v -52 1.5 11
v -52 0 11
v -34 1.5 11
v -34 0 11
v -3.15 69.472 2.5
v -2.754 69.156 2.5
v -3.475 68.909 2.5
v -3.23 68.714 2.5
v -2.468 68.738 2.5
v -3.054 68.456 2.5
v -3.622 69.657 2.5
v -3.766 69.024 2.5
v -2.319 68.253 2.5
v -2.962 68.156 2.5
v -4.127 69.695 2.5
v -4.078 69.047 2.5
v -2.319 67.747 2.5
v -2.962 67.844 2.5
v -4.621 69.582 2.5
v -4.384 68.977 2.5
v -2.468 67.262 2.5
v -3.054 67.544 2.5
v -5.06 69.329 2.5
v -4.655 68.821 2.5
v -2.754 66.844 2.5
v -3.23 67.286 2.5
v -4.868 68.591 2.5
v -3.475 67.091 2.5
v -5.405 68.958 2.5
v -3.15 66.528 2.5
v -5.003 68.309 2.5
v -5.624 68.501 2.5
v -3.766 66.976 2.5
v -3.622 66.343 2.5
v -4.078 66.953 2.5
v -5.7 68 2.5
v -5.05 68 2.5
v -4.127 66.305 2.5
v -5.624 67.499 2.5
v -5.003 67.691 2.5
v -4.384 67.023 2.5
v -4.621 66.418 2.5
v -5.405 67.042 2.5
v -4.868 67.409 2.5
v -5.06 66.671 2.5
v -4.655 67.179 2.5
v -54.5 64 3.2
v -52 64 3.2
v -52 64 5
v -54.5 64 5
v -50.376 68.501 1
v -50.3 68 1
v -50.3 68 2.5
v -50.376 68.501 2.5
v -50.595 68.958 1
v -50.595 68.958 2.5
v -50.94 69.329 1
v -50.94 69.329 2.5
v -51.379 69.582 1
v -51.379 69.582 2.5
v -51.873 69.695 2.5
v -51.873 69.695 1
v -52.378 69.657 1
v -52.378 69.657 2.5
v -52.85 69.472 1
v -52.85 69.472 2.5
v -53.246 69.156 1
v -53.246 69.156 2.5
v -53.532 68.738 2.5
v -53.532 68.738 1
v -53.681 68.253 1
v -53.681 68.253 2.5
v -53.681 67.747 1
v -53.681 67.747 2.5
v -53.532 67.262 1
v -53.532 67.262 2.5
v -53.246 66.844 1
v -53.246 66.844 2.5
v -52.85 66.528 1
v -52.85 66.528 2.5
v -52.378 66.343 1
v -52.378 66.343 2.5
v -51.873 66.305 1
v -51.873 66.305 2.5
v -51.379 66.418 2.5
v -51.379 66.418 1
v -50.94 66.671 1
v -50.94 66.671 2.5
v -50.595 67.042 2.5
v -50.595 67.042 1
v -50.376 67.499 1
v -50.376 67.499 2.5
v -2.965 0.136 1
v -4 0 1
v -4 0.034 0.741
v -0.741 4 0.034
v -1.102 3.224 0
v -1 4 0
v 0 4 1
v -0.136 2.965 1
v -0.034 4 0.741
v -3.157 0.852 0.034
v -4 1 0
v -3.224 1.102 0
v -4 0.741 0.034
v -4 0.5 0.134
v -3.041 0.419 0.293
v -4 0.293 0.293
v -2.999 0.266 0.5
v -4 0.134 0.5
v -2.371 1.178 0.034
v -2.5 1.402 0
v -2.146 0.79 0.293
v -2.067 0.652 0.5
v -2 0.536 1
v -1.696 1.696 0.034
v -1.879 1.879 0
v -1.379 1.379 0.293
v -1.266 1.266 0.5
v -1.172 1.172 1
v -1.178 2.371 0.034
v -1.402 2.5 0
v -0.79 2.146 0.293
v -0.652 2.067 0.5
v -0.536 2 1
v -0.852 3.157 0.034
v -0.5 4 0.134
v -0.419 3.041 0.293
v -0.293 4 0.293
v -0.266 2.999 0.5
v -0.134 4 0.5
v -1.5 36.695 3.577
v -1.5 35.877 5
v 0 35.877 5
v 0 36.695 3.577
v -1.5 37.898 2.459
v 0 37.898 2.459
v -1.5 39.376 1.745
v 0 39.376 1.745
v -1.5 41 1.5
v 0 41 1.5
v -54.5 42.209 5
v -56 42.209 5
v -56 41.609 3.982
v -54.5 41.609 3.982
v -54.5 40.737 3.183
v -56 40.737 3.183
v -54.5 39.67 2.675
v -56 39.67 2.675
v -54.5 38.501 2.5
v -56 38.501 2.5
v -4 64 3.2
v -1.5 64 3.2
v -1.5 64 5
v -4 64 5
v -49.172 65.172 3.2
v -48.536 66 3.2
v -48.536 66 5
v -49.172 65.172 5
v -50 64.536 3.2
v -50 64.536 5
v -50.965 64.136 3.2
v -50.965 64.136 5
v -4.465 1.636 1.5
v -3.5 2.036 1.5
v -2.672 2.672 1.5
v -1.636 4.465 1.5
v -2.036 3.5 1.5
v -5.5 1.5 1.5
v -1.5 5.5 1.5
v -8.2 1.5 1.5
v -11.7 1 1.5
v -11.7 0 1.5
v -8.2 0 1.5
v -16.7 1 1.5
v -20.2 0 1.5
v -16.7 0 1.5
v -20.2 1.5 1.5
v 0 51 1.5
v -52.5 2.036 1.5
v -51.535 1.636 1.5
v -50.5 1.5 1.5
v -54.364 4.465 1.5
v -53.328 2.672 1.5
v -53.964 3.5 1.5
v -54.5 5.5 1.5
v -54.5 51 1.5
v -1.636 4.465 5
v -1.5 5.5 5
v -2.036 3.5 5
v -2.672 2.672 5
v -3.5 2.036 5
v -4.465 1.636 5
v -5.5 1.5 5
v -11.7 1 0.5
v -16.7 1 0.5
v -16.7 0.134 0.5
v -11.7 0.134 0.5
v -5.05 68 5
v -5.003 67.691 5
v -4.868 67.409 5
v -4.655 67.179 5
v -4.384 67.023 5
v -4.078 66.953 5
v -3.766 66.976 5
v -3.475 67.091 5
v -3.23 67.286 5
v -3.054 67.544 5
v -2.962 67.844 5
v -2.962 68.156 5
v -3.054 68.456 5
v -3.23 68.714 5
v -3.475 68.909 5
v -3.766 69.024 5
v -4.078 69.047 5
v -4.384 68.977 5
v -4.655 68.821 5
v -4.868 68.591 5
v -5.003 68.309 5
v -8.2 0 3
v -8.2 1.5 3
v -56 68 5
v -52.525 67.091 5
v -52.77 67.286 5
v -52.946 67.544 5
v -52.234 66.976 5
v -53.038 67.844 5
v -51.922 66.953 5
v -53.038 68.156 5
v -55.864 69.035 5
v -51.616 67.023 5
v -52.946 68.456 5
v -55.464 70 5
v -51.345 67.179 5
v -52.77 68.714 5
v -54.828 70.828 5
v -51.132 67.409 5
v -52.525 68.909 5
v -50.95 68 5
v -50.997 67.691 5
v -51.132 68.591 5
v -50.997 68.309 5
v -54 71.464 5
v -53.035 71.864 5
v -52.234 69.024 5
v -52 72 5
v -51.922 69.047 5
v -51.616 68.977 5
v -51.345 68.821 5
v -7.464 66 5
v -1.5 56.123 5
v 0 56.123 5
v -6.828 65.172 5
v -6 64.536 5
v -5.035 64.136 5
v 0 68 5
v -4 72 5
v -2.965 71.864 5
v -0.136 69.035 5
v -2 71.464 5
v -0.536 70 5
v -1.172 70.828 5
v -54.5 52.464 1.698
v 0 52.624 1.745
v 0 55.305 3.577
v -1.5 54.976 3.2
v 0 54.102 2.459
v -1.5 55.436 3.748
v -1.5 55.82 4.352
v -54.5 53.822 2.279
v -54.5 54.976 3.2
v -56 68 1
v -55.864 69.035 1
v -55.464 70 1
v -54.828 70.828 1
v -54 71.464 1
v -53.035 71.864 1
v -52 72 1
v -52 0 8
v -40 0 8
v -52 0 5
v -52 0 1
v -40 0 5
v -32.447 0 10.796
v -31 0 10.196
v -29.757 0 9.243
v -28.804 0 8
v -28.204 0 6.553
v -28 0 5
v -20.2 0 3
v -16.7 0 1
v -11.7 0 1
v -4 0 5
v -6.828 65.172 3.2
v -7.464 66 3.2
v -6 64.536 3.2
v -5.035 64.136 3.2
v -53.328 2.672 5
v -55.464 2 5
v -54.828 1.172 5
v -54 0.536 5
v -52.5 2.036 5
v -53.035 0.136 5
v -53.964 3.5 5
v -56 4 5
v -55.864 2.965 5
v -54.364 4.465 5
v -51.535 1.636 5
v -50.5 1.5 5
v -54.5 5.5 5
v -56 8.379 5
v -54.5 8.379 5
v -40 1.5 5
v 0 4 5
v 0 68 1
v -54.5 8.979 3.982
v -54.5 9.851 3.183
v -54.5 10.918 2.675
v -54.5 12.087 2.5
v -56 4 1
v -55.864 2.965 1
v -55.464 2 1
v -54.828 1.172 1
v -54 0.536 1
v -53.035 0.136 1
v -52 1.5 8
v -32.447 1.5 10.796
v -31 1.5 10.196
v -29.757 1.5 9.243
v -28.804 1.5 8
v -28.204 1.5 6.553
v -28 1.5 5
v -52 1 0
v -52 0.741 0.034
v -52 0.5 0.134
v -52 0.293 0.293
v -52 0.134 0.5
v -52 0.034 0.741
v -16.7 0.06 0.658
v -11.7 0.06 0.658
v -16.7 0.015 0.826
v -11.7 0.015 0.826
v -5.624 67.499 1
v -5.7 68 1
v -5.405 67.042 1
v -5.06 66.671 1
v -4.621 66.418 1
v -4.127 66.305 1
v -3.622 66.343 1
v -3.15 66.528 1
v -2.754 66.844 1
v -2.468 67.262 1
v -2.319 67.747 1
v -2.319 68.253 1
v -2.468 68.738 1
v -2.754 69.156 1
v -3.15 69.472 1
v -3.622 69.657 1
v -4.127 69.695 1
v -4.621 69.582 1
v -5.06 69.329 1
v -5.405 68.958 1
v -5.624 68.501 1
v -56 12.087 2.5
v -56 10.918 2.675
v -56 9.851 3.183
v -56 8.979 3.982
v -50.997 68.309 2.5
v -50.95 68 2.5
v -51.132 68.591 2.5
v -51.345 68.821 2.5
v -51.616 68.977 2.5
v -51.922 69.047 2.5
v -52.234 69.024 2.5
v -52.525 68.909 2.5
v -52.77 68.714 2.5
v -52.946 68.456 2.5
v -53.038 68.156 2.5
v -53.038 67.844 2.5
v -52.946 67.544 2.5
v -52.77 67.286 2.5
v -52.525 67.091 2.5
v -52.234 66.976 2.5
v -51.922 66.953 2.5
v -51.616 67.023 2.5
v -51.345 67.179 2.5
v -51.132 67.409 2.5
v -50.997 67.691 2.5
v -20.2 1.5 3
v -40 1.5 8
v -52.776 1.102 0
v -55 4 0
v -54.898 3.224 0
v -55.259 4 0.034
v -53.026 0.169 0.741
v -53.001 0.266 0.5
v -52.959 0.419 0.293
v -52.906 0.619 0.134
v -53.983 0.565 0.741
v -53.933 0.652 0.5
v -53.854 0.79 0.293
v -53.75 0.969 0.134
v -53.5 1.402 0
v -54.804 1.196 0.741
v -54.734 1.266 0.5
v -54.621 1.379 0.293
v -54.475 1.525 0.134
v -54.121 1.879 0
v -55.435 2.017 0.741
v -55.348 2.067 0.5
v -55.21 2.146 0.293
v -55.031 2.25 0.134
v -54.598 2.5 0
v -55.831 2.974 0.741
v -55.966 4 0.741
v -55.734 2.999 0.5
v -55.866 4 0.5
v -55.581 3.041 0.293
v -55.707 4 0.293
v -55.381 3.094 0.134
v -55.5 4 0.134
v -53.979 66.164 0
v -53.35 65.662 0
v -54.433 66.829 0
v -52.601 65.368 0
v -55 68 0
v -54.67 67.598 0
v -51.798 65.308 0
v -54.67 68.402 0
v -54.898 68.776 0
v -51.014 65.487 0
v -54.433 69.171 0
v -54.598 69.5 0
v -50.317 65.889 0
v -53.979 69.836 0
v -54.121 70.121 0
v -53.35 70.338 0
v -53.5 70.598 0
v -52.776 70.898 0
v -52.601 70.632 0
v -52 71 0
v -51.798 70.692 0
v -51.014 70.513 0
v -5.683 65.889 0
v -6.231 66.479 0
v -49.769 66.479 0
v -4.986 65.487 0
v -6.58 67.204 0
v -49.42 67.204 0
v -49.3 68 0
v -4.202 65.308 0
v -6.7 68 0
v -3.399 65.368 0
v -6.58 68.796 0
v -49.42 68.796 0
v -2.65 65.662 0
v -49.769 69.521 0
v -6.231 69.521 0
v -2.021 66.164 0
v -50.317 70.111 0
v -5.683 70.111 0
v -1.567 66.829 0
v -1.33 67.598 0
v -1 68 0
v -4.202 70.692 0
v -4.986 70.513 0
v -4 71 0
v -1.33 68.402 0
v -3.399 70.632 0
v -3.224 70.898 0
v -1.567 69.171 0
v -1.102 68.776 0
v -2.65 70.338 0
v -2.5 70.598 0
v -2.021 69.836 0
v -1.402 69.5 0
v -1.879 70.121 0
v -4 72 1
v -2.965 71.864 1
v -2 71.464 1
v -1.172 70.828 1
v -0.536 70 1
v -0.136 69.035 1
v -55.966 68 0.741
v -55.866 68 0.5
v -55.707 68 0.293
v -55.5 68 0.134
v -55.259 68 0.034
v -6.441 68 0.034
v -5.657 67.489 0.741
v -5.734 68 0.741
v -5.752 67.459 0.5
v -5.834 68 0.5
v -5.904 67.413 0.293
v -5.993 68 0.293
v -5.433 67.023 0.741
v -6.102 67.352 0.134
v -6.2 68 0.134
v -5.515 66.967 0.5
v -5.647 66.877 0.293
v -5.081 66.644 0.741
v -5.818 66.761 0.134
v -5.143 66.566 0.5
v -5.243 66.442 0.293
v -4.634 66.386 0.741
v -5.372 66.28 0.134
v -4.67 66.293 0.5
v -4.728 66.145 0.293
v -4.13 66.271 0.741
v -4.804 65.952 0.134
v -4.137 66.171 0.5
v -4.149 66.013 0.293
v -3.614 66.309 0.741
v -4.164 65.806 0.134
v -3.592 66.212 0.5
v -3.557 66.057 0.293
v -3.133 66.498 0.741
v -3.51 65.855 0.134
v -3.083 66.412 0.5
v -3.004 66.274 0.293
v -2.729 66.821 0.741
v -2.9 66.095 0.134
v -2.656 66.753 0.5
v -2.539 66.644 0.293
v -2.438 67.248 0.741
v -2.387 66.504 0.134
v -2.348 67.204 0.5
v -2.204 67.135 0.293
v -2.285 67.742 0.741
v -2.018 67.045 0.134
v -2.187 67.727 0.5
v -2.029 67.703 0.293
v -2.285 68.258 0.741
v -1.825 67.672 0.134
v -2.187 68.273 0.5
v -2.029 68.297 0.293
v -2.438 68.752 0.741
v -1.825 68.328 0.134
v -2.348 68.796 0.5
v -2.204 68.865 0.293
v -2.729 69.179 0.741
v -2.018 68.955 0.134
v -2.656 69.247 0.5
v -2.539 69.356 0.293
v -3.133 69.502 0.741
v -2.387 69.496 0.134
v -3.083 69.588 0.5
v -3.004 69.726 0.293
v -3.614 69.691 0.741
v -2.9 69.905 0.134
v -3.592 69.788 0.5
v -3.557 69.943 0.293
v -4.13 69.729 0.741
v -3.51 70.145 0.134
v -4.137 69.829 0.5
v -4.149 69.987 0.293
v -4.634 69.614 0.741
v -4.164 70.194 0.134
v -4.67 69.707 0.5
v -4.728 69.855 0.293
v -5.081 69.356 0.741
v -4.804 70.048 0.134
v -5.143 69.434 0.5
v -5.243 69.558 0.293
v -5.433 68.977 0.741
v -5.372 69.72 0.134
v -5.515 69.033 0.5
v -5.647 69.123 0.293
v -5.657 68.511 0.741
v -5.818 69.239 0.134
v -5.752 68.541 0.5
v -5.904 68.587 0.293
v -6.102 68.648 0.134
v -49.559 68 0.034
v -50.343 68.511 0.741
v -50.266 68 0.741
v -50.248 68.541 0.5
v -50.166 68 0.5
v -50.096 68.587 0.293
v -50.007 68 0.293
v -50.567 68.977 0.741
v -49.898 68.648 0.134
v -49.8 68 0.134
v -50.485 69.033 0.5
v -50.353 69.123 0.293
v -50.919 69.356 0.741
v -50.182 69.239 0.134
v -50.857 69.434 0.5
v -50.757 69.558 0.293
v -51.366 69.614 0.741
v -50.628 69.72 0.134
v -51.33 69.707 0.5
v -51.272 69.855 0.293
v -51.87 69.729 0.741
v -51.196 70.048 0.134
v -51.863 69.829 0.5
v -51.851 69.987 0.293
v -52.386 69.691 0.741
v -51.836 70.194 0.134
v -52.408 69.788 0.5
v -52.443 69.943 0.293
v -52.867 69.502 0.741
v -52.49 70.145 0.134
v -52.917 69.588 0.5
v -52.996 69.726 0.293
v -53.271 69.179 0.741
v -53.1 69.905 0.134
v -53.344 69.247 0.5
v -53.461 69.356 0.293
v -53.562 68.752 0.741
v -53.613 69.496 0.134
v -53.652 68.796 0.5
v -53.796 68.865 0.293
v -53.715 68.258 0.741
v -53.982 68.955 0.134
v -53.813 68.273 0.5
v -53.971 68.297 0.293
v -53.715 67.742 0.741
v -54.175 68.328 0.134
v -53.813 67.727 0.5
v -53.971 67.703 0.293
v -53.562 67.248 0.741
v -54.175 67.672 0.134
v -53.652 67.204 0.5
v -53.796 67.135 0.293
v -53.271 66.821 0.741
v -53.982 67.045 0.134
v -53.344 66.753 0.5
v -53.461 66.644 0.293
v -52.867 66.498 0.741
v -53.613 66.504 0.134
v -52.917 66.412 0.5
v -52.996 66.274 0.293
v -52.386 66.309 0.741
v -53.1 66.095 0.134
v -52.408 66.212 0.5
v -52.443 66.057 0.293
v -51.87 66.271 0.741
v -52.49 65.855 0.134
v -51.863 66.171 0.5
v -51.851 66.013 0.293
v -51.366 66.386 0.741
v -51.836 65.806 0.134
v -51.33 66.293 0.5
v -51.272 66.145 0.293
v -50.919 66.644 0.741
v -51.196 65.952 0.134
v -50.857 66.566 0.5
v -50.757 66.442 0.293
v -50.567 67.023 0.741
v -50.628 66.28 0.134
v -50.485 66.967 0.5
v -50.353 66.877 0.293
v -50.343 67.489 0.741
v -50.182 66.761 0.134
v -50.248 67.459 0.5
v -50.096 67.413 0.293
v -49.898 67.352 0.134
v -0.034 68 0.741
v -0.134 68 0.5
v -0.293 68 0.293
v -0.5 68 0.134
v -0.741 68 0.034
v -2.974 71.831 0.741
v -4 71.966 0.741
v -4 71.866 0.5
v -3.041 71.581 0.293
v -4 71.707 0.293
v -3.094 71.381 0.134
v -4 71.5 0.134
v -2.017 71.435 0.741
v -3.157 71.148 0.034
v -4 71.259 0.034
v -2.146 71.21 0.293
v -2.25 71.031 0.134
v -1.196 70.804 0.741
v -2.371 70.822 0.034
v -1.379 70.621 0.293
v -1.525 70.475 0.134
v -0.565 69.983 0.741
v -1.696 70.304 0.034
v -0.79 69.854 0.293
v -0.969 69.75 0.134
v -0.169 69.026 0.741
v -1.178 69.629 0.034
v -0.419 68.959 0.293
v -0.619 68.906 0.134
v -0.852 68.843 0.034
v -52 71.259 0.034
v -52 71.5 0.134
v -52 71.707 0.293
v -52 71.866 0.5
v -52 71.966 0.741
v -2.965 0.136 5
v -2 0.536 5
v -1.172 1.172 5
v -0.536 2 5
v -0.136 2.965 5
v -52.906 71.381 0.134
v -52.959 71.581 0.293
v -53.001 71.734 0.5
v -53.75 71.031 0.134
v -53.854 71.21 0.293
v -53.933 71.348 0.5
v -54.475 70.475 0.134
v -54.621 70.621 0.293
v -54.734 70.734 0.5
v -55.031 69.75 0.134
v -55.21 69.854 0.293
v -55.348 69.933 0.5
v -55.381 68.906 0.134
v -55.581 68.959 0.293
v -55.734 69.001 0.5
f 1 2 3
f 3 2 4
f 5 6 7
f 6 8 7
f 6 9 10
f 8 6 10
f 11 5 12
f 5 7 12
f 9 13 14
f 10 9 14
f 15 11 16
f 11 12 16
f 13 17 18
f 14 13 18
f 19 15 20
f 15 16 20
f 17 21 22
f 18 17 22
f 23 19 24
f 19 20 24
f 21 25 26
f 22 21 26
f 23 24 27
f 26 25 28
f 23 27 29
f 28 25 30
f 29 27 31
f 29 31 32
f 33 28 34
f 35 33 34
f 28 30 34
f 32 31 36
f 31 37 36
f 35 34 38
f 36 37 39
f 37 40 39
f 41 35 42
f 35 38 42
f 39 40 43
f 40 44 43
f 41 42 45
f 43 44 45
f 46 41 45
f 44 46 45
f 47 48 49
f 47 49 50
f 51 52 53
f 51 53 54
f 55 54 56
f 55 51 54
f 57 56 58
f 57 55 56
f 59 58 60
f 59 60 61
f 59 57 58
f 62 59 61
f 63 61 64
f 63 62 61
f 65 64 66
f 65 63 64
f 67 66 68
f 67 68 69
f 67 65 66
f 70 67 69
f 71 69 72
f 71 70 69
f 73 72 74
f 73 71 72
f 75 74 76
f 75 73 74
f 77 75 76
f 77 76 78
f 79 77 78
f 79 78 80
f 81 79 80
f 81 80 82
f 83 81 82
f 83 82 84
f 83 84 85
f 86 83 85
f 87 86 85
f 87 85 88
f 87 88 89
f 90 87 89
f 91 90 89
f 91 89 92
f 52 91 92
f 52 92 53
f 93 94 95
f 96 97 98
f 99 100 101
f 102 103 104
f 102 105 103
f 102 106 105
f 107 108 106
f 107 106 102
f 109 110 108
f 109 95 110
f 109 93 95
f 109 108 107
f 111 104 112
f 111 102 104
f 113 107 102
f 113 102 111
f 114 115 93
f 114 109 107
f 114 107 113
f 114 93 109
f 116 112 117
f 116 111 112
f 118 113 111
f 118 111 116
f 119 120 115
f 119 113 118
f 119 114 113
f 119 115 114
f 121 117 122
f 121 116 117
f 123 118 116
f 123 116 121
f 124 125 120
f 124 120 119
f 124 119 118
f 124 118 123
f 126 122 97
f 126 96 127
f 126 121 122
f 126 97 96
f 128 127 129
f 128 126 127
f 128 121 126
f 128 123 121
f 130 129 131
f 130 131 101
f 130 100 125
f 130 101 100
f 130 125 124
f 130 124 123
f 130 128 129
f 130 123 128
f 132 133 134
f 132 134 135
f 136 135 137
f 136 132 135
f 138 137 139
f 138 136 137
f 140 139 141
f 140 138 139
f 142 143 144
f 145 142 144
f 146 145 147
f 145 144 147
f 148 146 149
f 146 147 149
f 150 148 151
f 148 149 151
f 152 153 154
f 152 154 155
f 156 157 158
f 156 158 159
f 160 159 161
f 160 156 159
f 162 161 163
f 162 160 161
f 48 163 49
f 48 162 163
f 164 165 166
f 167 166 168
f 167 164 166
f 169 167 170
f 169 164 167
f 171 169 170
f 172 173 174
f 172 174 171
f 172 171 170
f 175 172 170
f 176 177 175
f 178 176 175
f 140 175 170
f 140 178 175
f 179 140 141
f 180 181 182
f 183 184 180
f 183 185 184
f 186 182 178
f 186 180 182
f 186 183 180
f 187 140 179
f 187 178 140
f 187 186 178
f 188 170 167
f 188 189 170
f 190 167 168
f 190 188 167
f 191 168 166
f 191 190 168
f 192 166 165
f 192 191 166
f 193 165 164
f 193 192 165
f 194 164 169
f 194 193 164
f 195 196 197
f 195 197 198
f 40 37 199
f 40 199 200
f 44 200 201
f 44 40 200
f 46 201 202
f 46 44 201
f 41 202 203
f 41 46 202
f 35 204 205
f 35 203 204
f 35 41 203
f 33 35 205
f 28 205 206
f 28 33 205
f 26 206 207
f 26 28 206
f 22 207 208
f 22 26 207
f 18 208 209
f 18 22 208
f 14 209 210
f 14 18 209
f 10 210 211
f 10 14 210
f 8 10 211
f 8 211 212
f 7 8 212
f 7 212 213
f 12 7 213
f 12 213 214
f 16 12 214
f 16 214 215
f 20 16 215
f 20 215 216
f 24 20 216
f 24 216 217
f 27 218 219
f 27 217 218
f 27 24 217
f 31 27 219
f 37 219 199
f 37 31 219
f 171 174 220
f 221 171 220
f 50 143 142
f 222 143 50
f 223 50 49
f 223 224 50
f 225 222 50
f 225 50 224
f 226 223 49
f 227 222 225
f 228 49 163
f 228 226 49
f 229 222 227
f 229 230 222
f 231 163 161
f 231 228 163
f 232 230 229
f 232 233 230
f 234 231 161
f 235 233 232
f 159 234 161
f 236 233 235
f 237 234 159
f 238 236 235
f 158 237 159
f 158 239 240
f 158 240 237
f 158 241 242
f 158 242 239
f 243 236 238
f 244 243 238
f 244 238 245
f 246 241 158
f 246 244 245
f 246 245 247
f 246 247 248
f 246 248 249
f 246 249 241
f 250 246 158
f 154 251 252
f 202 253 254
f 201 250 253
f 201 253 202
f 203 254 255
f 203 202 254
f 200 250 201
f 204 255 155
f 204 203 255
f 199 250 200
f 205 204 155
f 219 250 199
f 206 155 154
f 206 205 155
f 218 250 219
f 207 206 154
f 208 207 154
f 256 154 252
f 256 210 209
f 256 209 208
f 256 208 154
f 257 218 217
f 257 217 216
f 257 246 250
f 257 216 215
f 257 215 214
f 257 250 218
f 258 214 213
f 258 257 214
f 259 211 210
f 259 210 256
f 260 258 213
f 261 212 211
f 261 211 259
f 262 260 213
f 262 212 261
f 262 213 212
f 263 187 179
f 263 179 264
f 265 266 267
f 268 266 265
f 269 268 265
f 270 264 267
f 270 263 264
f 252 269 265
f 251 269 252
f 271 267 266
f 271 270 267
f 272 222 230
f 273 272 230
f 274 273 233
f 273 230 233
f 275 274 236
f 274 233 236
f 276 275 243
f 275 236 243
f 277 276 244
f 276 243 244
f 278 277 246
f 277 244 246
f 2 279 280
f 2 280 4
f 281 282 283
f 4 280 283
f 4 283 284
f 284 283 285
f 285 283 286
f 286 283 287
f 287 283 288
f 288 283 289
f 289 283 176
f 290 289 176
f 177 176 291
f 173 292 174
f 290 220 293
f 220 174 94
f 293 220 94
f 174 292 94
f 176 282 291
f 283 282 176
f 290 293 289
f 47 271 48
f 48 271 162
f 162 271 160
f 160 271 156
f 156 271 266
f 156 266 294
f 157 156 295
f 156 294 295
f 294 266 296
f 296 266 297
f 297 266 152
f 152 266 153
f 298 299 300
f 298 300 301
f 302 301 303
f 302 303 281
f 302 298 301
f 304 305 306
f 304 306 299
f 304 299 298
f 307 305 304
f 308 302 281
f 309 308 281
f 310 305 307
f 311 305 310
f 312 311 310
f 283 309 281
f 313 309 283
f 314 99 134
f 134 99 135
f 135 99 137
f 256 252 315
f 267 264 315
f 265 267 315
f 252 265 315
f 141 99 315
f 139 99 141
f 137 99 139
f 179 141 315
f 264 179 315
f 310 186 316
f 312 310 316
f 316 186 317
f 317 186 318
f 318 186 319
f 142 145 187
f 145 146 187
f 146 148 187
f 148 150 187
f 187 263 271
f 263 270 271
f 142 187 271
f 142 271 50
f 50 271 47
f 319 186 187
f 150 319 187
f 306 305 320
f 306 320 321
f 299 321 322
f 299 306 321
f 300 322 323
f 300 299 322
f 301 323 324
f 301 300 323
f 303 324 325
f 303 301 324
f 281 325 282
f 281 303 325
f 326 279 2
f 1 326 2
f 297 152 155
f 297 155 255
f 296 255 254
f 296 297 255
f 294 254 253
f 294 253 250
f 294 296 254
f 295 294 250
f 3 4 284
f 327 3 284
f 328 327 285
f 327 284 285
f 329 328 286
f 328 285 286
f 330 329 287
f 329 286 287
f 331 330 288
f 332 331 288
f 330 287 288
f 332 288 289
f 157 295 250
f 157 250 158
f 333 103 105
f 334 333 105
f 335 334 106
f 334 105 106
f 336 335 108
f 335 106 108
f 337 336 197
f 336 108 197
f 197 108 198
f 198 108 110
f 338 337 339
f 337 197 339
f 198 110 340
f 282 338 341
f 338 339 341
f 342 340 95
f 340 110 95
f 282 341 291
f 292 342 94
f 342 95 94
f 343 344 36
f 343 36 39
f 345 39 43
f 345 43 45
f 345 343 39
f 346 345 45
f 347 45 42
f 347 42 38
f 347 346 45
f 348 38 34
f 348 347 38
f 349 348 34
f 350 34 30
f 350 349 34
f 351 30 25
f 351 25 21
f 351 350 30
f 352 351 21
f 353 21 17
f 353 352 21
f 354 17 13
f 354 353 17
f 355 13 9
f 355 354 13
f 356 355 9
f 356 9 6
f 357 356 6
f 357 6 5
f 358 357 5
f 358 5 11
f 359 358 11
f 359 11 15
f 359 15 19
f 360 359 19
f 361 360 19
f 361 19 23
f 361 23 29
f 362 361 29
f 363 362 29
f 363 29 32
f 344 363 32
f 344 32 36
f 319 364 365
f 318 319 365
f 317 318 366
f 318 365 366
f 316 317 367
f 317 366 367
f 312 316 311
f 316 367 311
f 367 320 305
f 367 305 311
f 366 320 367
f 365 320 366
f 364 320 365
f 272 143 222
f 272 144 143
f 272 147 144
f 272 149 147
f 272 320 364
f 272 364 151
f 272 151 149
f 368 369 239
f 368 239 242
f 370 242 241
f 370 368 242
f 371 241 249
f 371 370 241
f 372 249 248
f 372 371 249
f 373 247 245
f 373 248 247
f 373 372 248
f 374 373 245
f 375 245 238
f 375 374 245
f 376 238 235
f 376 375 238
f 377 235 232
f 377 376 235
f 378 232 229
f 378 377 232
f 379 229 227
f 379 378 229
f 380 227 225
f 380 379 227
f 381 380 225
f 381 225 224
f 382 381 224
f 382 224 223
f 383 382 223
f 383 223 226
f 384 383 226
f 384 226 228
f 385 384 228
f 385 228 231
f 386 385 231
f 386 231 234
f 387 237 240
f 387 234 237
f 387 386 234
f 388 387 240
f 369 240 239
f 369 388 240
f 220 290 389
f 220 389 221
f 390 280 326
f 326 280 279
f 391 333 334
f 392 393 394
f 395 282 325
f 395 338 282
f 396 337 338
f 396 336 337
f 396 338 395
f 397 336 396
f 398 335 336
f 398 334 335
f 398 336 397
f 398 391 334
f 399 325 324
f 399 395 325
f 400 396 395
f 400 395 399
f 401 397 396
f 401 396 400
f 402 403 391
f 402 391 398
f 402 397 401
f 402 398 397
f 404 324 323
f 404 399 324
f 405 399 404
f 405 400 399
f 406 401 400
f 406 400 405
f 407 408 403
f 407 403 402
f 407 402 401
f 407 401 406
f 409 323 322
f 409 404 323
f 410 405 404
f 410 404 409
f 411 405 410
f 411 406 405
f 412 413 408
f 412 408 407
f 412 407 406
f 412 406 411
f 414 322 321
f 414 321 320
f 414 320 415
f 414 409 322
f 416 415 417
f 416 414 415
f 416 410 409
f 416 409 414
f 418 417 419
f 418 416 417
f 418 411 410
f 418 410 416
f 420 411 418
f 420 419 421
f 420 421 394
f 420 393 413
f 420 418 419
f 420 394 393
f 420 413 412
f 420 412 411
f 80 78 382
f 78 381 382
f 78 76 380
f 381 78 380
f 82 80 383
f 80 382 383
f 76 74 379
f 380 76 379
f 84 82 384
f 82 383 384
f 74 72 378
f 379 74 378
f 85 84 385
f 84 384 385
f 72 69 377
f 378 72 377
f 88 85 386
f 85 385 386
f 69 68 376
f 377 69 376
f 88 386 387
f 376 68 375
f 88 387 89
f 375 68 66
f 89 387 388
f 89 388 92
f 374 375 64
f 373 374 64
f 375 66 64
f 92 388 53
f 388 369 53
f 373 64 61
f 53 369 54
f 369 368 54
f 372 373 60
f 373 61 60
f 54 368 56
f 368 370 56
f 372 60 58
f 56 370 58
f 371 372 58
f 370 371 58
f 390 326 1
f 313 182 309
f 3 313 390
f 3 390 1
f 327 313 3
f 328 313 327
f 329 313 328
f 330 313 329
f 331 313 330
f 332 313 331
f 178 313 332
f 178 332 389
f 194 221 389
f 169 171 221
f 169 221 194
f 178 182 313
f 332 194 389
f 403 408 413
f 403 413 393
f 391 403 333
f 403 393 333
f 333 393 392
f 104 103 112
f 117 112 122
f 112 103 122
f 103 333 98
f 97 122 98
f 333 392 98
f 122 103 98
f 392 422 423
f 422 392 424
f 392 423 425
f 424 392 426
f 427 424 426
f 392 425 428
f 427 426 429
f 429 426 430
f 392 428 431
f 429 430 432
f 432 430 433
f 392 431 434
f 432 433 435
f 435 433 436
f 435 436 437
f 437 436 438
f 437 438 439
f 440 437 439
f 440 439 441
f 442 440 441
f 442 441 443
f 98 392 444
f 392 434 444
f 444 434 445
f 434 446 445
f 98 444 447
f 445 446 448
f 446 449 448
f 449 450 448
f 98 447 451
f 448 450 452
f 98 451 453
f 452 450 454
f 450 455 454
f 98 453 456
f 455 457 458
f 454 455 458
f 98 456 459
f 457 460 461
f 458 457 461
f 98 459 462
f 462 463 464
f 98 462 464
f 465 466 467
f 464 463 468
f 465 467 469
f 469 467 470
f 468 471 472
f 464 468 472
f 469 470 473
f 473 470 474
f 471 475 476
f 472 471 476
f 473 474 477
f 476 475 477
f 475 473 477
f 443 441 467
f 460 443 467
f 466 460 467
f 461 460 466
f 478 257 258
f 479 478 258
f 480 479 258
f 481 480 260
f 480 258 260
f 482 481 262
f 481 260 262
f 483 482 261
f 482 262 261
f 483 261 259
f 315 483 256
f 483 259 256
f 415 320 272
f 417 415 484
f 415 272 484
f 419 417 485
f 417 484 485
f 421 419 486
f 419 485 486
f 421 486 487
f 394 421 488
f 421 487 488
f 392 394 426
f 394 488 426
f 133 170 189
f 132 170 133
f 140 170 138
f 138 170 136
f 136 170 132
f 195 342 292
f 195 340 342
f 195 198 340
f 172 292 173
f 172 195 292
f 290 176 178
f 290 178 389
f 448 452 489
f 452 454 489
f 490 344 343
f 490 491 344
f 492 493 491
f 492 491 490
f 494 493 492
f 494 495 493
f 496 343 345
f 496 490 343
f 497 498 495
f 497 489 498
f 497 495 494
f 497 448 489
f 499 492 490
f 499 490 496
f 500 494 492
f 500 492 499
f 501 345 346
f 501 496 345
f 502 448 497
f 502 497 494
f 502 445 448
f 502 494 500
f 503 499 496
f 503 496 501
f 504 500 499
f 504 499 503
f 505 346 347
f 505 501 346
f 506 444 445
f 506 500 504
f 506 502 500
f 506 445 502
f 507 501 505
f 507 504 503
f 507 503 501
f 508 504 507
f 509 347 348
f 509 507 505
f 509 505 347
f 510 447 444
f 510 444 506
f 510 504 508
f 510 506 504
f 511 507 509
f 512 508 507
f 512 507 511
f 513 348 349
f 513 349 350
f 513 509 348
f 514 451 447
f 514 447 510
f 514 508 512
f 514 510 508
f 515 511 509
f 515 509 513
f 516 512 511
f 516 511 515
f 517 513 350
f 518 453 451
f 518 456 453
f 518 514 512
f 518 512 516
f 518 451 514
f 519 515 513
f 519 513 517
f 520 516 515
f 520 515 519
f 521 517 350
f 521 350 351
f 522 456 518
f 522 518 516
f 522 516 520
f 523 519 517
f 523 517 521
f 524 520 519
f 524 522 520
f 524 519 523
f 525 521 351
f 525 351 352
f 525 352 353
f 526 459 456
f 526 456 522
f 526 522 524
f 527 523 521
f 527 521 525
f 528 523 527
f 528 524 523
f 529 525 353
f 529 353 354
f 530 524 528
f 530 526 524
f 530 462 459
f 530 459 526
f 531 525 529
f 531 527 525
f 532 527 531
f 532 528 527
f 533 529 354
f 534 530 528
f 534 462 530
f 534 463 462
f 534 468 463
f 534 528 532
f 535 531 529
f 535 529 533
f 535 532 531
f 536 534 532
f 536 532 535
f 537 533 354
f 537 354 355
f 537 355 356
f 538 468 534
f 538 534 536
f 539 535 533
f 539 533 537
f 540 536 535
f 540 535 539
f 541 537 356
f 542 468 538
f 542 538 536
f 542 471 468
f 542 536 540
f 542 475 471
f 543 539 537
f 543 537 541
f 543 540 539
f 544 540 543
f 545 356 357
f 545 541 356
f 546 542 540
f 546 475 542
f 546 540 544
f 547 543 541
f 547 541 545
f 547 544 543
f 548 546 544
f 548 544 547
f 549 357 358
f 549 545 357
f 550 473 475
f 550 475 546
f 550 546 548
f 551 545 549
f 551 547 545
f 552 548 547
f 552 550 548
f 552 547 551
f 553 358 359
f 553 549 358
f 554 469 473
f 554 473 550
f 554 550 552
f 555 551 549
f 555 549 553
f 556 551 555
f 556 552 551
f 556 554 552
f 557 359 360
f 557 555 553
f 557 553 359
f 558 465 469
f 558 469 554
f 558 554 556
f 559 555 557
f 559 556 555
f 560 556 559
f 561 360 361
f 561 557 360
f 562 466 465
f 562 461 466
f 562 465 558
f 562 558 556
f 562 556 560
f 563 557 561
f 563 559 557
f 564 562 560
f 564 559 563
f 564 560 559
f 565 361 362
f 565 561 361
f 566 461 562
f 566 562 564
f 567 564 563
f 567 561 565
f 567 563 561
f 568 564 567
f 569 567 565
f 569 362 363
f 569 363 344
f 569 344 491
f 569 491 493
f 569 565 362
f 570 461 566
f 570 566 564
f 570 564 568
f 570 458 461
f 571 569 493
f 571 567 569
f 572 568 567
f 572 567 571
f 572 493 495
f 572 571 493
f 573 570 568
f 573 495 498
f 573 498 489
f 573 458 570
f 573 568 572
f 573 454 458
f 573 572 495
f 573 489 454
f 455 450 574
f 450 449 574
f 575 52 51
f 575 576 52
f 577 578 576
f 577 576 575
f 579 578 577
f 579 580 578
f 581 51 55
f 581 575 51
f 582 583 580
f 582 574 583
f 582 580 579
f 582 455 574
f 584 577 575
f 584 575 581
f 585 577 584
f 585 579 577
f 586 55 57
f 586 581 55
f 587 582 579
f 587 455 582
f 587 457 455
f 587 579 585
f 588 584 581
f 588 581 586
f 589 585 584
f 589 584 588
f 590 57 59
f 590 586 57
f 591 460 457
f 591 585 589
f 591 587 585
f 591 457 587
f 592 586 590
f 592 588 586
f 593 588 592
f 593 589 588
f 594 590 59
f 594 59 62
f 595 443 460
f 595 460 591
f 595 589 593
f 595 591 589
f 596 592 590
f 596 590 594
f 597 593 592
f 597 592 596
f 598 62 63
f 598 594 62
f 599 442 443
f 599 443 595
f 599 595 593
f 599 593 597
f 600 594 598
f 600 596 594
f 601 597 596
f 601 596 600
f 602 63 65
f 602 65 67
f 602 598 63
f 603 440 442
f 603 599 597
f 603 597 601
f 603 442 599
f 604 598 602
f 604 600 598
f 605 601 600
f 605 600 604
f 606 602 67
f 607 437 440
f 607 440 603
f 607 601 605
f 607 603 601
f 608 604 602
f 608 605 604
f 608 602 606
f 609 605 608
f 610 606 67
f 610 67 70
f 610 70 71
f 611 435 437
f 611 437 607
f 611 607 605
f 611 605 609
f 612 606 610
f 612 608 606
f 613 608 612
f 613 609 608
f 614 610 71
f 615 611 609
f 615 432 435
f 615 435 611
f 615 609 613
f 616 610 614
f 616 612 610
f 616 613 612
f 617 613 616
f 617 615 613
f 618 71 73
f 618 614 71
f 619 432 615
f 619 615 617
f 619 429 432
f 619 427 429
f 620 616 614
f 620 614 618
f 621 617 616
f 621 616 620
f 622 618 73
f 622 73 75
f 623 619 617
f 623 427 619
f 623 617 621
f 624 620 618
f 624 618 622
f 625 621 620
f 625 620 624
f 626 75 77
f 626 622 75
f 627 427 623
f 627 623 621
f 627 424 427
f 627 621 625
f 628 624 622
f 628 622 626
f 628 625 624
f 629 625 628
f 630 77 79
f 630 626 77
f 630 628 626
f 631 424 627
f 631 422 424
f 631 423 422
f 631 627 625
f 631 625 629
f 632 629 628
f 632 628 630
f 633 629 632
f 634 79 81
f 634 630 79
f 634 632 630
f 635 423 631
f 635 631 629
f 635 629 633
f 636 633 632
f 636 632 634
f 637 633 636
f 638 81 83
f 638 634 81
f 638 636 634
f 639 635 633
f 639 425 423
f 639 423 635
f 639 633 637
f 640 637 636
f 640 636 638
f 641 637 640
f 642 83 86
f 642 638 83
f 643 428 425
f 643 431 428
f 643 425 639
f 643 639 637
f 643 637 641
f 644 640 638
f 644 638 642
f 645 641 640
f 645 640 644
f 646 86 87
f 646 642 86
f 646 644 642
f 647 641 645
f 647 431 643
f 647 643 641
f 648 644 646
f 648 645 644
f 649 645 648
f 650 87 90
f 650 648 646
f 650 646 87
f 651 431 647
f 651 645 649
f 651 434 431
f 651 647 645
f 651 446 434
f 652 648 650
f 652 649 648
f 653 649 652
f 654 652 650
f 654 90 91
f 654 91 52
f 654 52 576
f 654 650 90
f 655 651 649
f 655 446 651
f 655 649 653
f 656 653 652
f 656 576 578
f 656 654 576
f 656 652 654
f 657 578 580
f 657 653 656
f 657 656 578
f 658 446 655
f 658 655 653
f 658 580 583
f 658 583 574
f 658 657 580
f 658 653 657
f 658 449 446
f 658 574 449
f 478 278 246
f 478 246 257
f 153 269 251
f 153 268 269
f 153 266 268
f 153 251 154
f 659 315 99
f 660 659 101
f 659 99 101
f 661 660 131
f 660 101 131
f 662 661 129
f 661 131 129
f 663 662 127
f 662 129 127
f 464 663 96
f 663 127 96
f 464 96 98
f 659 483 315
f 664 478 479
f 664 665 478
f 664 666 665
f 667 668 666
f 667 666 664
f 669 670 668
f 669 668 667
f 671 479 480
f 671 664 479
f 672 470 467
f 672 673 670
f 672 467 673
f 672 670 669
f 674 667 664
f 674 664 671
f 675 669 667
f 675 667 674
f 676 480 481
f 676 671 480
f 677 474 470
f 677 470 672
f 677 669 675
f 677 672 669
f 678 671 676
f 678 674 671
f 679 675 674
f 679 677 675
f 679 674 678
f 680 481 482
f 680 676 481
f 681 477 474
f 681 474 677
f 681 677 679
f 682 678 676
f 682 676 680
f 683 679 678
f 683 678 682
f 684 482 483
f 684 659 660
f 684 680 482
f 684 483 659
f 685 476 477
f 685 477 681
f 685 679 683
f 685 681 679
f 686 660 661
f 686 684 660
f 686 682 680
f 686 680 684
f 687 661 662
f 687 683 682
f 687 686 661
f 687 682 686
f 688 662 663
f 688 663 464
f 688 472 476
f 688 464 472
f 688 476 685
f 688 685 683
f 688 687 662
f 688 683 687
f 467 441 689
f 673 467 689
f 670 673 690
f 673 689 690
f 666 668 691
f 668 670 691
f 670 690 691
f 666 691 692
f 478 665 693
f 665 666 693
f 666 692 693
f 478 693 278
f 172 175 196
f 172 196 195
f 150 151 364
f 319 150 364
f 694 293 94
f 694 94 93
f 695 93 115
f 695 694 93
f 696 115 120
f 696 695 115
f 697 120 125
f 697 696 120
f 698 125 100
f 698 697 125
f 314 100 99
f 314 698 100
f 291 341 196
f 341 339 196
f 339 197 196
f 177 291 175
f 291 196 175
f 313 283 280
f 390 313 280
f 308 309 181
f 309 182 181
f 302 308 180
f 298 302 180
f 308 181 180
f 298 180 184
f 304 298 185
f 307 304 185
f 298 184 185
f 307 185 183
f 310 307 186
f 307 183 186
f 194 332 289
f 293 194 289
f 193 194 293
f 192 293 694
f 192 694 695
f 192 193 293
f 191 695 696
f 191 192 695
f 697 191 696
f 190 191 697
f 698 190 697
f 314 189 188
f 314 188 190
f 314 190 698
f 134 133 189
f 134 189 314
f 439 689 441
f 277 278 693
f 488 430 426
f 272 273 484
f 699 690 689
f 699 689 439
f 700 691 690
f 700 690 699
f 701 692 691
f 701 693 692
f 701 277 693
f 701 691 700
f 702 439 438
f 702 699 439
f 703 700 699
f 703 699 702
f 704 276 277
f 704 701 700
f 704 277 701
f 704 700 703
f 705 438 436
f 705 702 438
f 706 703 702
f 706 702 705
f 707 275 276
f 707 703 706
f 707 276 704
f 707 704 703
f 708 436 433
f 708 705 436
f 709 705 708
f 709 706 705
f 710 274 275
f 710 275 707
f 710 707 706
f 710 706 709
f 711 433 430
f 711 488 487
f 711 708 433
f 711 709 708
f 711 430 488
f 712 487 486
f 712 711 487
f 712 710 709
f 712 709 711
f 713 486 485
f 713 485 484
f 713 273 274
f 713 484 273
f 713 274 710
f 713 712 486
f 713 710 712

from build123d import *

# Parameters (mm, degrees)
SKETCH_1_W               = 56
SKETCH_1_H               = 72
EXTRUDE_1_DEPTH          = 5
SHELL_1_T                = -1.5
EXTRUDE_2_DEPTH          = 5
EXTRUDE_4_REACH          = 93.351
SKETCH_11_W              = 3.2
SKETCH_11_H              = 28
CUT_EXTRUDE_1_REACH      = 93.351
SKETCH_2_7_R             = 1.05
SKETCH_2_8_R             = 1.7
CUT_EXTRUDE_2_DEPTH      = 2.5
EXTRUDE_3_DEPTH          = 1.5
CUT_EXTRUDE_3_REACH      = 93.875
SKETCH_10_3_W            = 12
SKETCH_10_3_H            = 1.5
CUT_EXTRUDE_4_DEPTH      = 92.874914966
CUT_EXTRUDE_4_DEPTH_BACK = 1
SKETCH_10_4_W            = 5
SKETCH_10_4_H            = 1
CUT_EXTRUDE_5_REACH      = 93.875
CUT_EXTRUDE_START        = -54.5
CUT_EXTRUDE_6_DEPTH      = 54.5
FILLET_1_R               = 4
FILLET_2_R               = 4
FILLET_3_R               = 1


with BuildPart() as part:
    # 草图1 → 凸台-拉伸1 (new body)
    with BuildSketch(Plane.XY):
        with Locations((-28, 36)):
            Rectangle(SKETCH_1_W, SKETCH_1_H)
    extrude(amount=EXTRUDE_1_DEPTH)

    # 抽壳1
    shell_1_openings = [part.faces().sort_by_distance(p)[0] for p in [
        (-28, 36, 5),
    ]]
    offset(amount=SHELL_1_T, openings=shell_1_openings, kind=Kind.INTERSECTION)

    # 草图2 → 凸台-拉伸2 (add)
    with BuildSketch(Plane.XY):
        with BuildLine():
            Line((0, 72), (0, 68))
            ThreePointArc((0, 68), (-0.394448725, 66.267949192), (-1.5, 64.877501001))
            Line((-1.5, 64.877501001), (-1.5, 64))
            Line((-1.5, 64), (-4, 64))
            ThreePointArc((-4, 64), (-6, 64.535898385), (-7.464101615, 66))
            Line((-7.464101615, 66), (-48.535898385, 66))
            ThreePointArc((-48.535898385, 66), (-50, 64.535898385), (-52, 64))
            Line((-52, 64), (-54.5, 64))
            Line((-54.5, 64), (-54.5, 64.877501001))
            ThreePointArc((-54.5, 64.877501001), (-55.605551275, 66.267949192), (-56, 68))
            Line((-56, 68), (-56, 72))
            Line((-56, 72), (0, 72))
        make_face()
    extrude(amount=EXTRUDE_2_DEPTH)

    # 草图11 → 凸台-拉伸4 (add, up to next)
    with BuildSketch(Plane(origin=(0, 0, 0), x_dir=(0, 0, -1), z_dir=(1, 0, 0)), mode=Mode.PRIVATE) as extrude_4_sk1:
        with Locations((-1.6, 58)):
            Rectangle(SKETCH_11_W, SKETCH_11_H)
    extrude_4_tool1 = extrude(extrude_4_sk1.sketch, amount=-EXTRUDE_4_REACH, mode=Mode.PRIVATE) - part.part
    add(extrude_4_tool1.solids().sort_by_distance((0, 58, 1.6))[0])

    # 草图2<7> → 切除-拉伸1 (cut, up to next)
    with BuildSketch(Plane.XY, mode=Mode.PRIVATE) as cut_extrude_1_sk1:
        with Locations((-52, 68)):
            Circle(SKETCH_2_7_R)
    cut_extrude_1_tool1 = extrude(cut_extrude_1_sk1.sketch, amount=CUT_EXTRUDE_1_REACH, mode=Mode.PRIVATE) & part.part
    # 草图2<7> → 切除-拉伸1 (cut, up to next)
    with BuildSketch(Plane.XY, mode=Mode.PRIVATE) as cut_extrude_1_sk2:
        with Locations(Location((-4, 68, 0), (0, 0, 180))):
            Circle(SKETCH_2_7_R)
    cut_extrude_1_tool2 = extrude(cut_extrude_1_sk2.sketch, amount=CUT_EXTRUDE_1_REACH, mode=Mode.PRIVATE) & part.part
    add(cut_extrude_1_tool1.solids().sort_by_distance((-52, 68, 0))[0], mode=Mode.SUBTRACT)
    add(cut_extrude_1_tool2.solids().sort_by_distance((-4, 68, 0))[0], mode=Mode.SUBTRACT)

    # 草图2<8> → 切除-拉伸2 (cut)
    with BuildSketch(Plane.XY):
        with Locations((-52, 68)):
            Circle(SKETCH_2_8_R)
        with Locations(Location((-4, 68, 0), (0, 0, 180))):
            Circle(SKETCH_2_8_R)
    extrude(amount=CUT_EXTRUDE_2_DEPTH, mode=Mode.SUBTRACT)

    # 草图10 → 凸台-拉伸3 (add)
    with BuildSketch(Plane.XZ):
        with BuildLine():
            Line((-40, 5), (-40, 8))
            Line((-40, 8), (-52, 8))
            Line((-52, 8), (-52, 11))
            Line((-52, 11), (-34, 11))
            ThreePointArc((-34, 11), (-29.757359313, 9.242640687), (-28, 5))
            Line((-28, 5), (-40, 5))
        make_face()
    extrude(amount=-EXTRUDE_3_DEPTH)

    # 草图10<3> → 切除-拉伸3 (cut, up to next)
    with BuildSketch(Plane.XZ, mode=Mode.PRIVATE) as cut_extrude_3_sk1:
        with Locations((-14.2, 2.25)):
            Rectangle(SKETCH_10_3_W, SKETCH_10_3_H)
    cut_extrude_3_tool1 = extrude(cut_extrude_3_sk1.sketch, amount=-CUT_EXTRUDE_3_REACH, mode=Mode.PRIVATE) & part.part
    add(cut_extrude_3_tool1.solids().sort_by_distance((-14.2, 0, 2.25))[0], mode=Mode.SUBTRACT)

    # 草图10<4> → 切除-拉伸4 (cut, two sides: drawn at the far end of the back side and taken through both)
    with BuildSketch(Plane.XZ.offset(-CUT_EXTRUDE_4_DEPTH_BACK)):
        with Locations((-14.2, 1)):
            Rectangle(SKETCH_10_4_W, SKETCH_10_4_H)
    extrude(amount=CUT_EXTRUDE_4_DEPTH + CUT_EXTRUDE_4_DEPTH_BACK, mode=Mode.SUBTRACT)

    # 草图8 → 切除-拉伸5 (cut, up to next)
    with BuildSketch(Plane.ZY.offset(56), mode=Mode.PRIVATE) as cut_extrude_5_sk1:
        with BuildLine():
            Line((2.5, 38.500900756), (2.5, 12.087099244))
            ThreePointArc((2.5, 12.087099244), (3.18337521, 9.851031266), (5, 8.379))
            Line((5, 8.379), (5, 42.209))
            ThreePointArc((5, 42.209), (3.18337521, 40.736968734), (2.5, 38.500900756))
        make_face()
    cut_extrude_5_tool1 = extrude(cut_extrude_5_sk1.sketch, amount=-CUT_EXTRUDE_5_REACH, mode=Mode.PRIVATE) & part.part
    add(cut_extrude_5_tool1.solids().sort_by_distance((-56, 25.294, 3.786685))[0], mode=Mode.SUBTRACT)

    # 草图9 → 切除-拉伸6 (cut)
    with BuildSketch(Plane(origin=(0, 0, 0), x_dir=(0, 0, -1), z_dir=(1, 0, 0)).offset(CUT_EXTRUDE_START)):
        with BuildLine():
            Line((-1.5, 41), (-1.5, 51))
            ThreePointArc((-1.5, 51), (-7, 56.5), (-12.5, 51))
            Line((-12.5, 51), (-12.5, 41))
            ThreePointArc((-12.5, 41), (-7, 35.5), (-1.5, 41))
        make_face()
    extrude(amount=CUT_EXTRUDE_6_DEPTH, mode=Mode.SUBTRACT)

    # 圆角1
    fillet_1_edges = [part.edges().sort_by_distance(p)[0] for p in [
        (0, 0, 2.5),
        (-56, 0, 2.5),
        (-56, 72, 2.5),
        (0, 72, 2.5),
    ]]
    fillet(fillet_1_edges, radius=FILLET_1_R)

    # 圆角2
    fillet_2_edges = [part.edges().sort_by_distance(p)[0] for p in [
        (-1.5, 1.5, 3.25),
        (-54.5, 1.5, 3.25),
    ]]
    fillet(fillet_2_edges, radius=FILLET_2_R)

    # 圆角3
    # the kernel refuses this fillet: 1 mm, written as the material it takes off along each edge
    with BuildSketch(Plane(origin=(-52, 68, 0), x_dir=(1, 0, 0), z_dir=(0, -1, 0))) as fillet_3_piece_1:
        with BuildLine():
            CenterArc((1.7 + FILLET_3_R, FILLET_3_R), FILLET_3_R, 180, 90)
            Line((1.7, FILLET_3_R), (1.7, 0))
            Line((1.7, 0), (1.7 + FILLET_3_R, 0))
        make_face()
    revolve(axis=Axis((-52, 68, 0), (0, 0, 1)), mode=Mode.SUBTRACT)
    with BuildSketch(Plane(origin=(-4, 68, 0), x_dir=(-1, 0, 0), z_dir=(0, 1, 0))) as fillet_3_piece_2:
        with BuildLine():
            CenterArc((1.7 + FILLET_3_R, FILLET_3_R), FILLET_3_R, 180, 90)
            Line((1.7, FILLET_3_R), (1.7, 0))
            Line((1.7, 0), (1.7 + FILLET_3_R, 0))
        make_face()
    revolve(axis=Axis((-4, 68, 0), (0, 0, 1)), mode=Mode.SUBTRACT)
    with BuildSketch(Plane(origin=(-4, 4, 0), x_dir=(0, -1, 0), z_dir=(-1, 0, 0))) as fillet_3_piece_3:
        with BuildLine():
            CenterArc((4 - FILLET_3_R, FILLET_3_R), FILLET_3_R, 270, 90)
            Line((4 - FILLET_3_R, 0), (4, 0))
            Line((4, 0), (4, FILLET_3_R))
        make_face()
    revolve(axis=Axis((-4, 4, 0), (0, 0, 1)), revolution_arc=90, mode=Mode.SUBTRACT)
    with BuildSketch(Plane(origin=(0, 4, 0), x_dir=(0, 0, 1), z_dir=(0, 1, 0))) as fillet_3_piece_4:
        with BuildLine():
            CenterArc((FILLET_3_R, -FILLET_3_R), FILLET_3_R, 90, 90)
            Line((0, -FILLET_3_R), (0, 0))
            Line((0, 0), (FILLET_3_R, 0))
        make_face()
    extrude(amount=64, mode=Mode.SUBTRACT)
    with BuildSketch(Plane(origin=(-4, 68, 0), x_dir=(0, 1, 0), z_dir=(-1, 0, 0))) as fillet_3_piece_5:
        with BuildLine():
            CenterArc((4 - FILLET_3_R, -FILLET_3_R), FILLET_3_R, 0, 90)
            Line((4, -FILLET_3_R), (4, 0))
            Line((4, 0), (4 - FILLET_3_R, 0))
        make_face()
    revolve(axis=Axis((-4, 68, 0), (0, 0, -1)), revolution_arc=90, mode=Mode.SUBTRACT)
    with BuildSketch(Plane(origin=(-52, 72, 0), x_dir=(0, -1, 0), z_dir=(1, 0, 0))) as fillet_3_piece_6:
        with BuildLine():
            CenterArc((FILLET_3_R, -FILLET_3_R), FILLET_3_R, 90, 90)
            Line((0, -FILLET_3_R), (0, 0))
            Line((0, 0), (FILLET_3_R, 0))
        make_face()
    extrude(amount=48, mode=Mode.SUBTRACT)
    with BuildSketch(Plane(origin=(-52, 68, 0), x_dir=(0, 1, 0), z_dir=(1, 0, 0))) as fillet_3_piece_7:
        with BuildLine():
            CenterArc((4 - FILLET_3_R, FILLET_3_R), FILLET_3_R, 270, 90)
            Line((4, FILLET_3_R), (4, 0))
            Line((4, 0), (4 - FILLET_3_R, 0))
        make_face()
    revolve(axis=Axis((-52, 68, 0), (0, 0, 1)), revolution_arc=90, mode=Mode.SUBTRACT)
    with BuildSketch(Plane(origin=(-56, 68, 0), x_dir=(1, 0, 0), z_dir=(0, -1, 0))) as fillet_3_piece_8:
        with BuildLine():
            CenterArc((FILLET_3_R, FILLET_3_R), FILLET_3_R, 180, 90)
            Line((0, FILLET_3_R), (0, 0))
            Line((0, 0), (FILLET_3_R, 0))
        make_face()
    extrude(amount=64, mode=Mode.SUBTRACT)
    with BuildSketch(Plane(origin=(-52, 4, 0), x_dir=(0, -1, 0), z_dir=(1, 0, 0))) as fillet_3_piece_9:
        with BuildLine():
            CenterArc((4 - FILLET_3_R, -FILLET_3_R), FILLET_3_R, 0, 90)
            Line((4, -FILLET_3_R), (4, 0))
            Line((4, 0), (4 - FILLET_3_R, 0))
        make_face()
    revolve(axis=Axis((-52, 4, 0), (0, 0, -1)), revolution_arc=90, mode=Mode.SUBTRACT)
    with BuildSketch(Plane(origin=(-4, 0, 0), x_dir=(0, 0, 1), z_dir=(-1, 0, 0))) as fillet_3_piece_10:
        with BuildLine():
            CenterArc((FILLET_3_R, FILLET_3_R), FILLET_3_R, 180, 90)
            Line((0, FILLET_3_R), (0, 0))
            Line((0, 0), (FILLET_3_R, 0))
        make_face()
    extrude(amount=48, mode=Mode.SUBTRACT)


solid = part.part
